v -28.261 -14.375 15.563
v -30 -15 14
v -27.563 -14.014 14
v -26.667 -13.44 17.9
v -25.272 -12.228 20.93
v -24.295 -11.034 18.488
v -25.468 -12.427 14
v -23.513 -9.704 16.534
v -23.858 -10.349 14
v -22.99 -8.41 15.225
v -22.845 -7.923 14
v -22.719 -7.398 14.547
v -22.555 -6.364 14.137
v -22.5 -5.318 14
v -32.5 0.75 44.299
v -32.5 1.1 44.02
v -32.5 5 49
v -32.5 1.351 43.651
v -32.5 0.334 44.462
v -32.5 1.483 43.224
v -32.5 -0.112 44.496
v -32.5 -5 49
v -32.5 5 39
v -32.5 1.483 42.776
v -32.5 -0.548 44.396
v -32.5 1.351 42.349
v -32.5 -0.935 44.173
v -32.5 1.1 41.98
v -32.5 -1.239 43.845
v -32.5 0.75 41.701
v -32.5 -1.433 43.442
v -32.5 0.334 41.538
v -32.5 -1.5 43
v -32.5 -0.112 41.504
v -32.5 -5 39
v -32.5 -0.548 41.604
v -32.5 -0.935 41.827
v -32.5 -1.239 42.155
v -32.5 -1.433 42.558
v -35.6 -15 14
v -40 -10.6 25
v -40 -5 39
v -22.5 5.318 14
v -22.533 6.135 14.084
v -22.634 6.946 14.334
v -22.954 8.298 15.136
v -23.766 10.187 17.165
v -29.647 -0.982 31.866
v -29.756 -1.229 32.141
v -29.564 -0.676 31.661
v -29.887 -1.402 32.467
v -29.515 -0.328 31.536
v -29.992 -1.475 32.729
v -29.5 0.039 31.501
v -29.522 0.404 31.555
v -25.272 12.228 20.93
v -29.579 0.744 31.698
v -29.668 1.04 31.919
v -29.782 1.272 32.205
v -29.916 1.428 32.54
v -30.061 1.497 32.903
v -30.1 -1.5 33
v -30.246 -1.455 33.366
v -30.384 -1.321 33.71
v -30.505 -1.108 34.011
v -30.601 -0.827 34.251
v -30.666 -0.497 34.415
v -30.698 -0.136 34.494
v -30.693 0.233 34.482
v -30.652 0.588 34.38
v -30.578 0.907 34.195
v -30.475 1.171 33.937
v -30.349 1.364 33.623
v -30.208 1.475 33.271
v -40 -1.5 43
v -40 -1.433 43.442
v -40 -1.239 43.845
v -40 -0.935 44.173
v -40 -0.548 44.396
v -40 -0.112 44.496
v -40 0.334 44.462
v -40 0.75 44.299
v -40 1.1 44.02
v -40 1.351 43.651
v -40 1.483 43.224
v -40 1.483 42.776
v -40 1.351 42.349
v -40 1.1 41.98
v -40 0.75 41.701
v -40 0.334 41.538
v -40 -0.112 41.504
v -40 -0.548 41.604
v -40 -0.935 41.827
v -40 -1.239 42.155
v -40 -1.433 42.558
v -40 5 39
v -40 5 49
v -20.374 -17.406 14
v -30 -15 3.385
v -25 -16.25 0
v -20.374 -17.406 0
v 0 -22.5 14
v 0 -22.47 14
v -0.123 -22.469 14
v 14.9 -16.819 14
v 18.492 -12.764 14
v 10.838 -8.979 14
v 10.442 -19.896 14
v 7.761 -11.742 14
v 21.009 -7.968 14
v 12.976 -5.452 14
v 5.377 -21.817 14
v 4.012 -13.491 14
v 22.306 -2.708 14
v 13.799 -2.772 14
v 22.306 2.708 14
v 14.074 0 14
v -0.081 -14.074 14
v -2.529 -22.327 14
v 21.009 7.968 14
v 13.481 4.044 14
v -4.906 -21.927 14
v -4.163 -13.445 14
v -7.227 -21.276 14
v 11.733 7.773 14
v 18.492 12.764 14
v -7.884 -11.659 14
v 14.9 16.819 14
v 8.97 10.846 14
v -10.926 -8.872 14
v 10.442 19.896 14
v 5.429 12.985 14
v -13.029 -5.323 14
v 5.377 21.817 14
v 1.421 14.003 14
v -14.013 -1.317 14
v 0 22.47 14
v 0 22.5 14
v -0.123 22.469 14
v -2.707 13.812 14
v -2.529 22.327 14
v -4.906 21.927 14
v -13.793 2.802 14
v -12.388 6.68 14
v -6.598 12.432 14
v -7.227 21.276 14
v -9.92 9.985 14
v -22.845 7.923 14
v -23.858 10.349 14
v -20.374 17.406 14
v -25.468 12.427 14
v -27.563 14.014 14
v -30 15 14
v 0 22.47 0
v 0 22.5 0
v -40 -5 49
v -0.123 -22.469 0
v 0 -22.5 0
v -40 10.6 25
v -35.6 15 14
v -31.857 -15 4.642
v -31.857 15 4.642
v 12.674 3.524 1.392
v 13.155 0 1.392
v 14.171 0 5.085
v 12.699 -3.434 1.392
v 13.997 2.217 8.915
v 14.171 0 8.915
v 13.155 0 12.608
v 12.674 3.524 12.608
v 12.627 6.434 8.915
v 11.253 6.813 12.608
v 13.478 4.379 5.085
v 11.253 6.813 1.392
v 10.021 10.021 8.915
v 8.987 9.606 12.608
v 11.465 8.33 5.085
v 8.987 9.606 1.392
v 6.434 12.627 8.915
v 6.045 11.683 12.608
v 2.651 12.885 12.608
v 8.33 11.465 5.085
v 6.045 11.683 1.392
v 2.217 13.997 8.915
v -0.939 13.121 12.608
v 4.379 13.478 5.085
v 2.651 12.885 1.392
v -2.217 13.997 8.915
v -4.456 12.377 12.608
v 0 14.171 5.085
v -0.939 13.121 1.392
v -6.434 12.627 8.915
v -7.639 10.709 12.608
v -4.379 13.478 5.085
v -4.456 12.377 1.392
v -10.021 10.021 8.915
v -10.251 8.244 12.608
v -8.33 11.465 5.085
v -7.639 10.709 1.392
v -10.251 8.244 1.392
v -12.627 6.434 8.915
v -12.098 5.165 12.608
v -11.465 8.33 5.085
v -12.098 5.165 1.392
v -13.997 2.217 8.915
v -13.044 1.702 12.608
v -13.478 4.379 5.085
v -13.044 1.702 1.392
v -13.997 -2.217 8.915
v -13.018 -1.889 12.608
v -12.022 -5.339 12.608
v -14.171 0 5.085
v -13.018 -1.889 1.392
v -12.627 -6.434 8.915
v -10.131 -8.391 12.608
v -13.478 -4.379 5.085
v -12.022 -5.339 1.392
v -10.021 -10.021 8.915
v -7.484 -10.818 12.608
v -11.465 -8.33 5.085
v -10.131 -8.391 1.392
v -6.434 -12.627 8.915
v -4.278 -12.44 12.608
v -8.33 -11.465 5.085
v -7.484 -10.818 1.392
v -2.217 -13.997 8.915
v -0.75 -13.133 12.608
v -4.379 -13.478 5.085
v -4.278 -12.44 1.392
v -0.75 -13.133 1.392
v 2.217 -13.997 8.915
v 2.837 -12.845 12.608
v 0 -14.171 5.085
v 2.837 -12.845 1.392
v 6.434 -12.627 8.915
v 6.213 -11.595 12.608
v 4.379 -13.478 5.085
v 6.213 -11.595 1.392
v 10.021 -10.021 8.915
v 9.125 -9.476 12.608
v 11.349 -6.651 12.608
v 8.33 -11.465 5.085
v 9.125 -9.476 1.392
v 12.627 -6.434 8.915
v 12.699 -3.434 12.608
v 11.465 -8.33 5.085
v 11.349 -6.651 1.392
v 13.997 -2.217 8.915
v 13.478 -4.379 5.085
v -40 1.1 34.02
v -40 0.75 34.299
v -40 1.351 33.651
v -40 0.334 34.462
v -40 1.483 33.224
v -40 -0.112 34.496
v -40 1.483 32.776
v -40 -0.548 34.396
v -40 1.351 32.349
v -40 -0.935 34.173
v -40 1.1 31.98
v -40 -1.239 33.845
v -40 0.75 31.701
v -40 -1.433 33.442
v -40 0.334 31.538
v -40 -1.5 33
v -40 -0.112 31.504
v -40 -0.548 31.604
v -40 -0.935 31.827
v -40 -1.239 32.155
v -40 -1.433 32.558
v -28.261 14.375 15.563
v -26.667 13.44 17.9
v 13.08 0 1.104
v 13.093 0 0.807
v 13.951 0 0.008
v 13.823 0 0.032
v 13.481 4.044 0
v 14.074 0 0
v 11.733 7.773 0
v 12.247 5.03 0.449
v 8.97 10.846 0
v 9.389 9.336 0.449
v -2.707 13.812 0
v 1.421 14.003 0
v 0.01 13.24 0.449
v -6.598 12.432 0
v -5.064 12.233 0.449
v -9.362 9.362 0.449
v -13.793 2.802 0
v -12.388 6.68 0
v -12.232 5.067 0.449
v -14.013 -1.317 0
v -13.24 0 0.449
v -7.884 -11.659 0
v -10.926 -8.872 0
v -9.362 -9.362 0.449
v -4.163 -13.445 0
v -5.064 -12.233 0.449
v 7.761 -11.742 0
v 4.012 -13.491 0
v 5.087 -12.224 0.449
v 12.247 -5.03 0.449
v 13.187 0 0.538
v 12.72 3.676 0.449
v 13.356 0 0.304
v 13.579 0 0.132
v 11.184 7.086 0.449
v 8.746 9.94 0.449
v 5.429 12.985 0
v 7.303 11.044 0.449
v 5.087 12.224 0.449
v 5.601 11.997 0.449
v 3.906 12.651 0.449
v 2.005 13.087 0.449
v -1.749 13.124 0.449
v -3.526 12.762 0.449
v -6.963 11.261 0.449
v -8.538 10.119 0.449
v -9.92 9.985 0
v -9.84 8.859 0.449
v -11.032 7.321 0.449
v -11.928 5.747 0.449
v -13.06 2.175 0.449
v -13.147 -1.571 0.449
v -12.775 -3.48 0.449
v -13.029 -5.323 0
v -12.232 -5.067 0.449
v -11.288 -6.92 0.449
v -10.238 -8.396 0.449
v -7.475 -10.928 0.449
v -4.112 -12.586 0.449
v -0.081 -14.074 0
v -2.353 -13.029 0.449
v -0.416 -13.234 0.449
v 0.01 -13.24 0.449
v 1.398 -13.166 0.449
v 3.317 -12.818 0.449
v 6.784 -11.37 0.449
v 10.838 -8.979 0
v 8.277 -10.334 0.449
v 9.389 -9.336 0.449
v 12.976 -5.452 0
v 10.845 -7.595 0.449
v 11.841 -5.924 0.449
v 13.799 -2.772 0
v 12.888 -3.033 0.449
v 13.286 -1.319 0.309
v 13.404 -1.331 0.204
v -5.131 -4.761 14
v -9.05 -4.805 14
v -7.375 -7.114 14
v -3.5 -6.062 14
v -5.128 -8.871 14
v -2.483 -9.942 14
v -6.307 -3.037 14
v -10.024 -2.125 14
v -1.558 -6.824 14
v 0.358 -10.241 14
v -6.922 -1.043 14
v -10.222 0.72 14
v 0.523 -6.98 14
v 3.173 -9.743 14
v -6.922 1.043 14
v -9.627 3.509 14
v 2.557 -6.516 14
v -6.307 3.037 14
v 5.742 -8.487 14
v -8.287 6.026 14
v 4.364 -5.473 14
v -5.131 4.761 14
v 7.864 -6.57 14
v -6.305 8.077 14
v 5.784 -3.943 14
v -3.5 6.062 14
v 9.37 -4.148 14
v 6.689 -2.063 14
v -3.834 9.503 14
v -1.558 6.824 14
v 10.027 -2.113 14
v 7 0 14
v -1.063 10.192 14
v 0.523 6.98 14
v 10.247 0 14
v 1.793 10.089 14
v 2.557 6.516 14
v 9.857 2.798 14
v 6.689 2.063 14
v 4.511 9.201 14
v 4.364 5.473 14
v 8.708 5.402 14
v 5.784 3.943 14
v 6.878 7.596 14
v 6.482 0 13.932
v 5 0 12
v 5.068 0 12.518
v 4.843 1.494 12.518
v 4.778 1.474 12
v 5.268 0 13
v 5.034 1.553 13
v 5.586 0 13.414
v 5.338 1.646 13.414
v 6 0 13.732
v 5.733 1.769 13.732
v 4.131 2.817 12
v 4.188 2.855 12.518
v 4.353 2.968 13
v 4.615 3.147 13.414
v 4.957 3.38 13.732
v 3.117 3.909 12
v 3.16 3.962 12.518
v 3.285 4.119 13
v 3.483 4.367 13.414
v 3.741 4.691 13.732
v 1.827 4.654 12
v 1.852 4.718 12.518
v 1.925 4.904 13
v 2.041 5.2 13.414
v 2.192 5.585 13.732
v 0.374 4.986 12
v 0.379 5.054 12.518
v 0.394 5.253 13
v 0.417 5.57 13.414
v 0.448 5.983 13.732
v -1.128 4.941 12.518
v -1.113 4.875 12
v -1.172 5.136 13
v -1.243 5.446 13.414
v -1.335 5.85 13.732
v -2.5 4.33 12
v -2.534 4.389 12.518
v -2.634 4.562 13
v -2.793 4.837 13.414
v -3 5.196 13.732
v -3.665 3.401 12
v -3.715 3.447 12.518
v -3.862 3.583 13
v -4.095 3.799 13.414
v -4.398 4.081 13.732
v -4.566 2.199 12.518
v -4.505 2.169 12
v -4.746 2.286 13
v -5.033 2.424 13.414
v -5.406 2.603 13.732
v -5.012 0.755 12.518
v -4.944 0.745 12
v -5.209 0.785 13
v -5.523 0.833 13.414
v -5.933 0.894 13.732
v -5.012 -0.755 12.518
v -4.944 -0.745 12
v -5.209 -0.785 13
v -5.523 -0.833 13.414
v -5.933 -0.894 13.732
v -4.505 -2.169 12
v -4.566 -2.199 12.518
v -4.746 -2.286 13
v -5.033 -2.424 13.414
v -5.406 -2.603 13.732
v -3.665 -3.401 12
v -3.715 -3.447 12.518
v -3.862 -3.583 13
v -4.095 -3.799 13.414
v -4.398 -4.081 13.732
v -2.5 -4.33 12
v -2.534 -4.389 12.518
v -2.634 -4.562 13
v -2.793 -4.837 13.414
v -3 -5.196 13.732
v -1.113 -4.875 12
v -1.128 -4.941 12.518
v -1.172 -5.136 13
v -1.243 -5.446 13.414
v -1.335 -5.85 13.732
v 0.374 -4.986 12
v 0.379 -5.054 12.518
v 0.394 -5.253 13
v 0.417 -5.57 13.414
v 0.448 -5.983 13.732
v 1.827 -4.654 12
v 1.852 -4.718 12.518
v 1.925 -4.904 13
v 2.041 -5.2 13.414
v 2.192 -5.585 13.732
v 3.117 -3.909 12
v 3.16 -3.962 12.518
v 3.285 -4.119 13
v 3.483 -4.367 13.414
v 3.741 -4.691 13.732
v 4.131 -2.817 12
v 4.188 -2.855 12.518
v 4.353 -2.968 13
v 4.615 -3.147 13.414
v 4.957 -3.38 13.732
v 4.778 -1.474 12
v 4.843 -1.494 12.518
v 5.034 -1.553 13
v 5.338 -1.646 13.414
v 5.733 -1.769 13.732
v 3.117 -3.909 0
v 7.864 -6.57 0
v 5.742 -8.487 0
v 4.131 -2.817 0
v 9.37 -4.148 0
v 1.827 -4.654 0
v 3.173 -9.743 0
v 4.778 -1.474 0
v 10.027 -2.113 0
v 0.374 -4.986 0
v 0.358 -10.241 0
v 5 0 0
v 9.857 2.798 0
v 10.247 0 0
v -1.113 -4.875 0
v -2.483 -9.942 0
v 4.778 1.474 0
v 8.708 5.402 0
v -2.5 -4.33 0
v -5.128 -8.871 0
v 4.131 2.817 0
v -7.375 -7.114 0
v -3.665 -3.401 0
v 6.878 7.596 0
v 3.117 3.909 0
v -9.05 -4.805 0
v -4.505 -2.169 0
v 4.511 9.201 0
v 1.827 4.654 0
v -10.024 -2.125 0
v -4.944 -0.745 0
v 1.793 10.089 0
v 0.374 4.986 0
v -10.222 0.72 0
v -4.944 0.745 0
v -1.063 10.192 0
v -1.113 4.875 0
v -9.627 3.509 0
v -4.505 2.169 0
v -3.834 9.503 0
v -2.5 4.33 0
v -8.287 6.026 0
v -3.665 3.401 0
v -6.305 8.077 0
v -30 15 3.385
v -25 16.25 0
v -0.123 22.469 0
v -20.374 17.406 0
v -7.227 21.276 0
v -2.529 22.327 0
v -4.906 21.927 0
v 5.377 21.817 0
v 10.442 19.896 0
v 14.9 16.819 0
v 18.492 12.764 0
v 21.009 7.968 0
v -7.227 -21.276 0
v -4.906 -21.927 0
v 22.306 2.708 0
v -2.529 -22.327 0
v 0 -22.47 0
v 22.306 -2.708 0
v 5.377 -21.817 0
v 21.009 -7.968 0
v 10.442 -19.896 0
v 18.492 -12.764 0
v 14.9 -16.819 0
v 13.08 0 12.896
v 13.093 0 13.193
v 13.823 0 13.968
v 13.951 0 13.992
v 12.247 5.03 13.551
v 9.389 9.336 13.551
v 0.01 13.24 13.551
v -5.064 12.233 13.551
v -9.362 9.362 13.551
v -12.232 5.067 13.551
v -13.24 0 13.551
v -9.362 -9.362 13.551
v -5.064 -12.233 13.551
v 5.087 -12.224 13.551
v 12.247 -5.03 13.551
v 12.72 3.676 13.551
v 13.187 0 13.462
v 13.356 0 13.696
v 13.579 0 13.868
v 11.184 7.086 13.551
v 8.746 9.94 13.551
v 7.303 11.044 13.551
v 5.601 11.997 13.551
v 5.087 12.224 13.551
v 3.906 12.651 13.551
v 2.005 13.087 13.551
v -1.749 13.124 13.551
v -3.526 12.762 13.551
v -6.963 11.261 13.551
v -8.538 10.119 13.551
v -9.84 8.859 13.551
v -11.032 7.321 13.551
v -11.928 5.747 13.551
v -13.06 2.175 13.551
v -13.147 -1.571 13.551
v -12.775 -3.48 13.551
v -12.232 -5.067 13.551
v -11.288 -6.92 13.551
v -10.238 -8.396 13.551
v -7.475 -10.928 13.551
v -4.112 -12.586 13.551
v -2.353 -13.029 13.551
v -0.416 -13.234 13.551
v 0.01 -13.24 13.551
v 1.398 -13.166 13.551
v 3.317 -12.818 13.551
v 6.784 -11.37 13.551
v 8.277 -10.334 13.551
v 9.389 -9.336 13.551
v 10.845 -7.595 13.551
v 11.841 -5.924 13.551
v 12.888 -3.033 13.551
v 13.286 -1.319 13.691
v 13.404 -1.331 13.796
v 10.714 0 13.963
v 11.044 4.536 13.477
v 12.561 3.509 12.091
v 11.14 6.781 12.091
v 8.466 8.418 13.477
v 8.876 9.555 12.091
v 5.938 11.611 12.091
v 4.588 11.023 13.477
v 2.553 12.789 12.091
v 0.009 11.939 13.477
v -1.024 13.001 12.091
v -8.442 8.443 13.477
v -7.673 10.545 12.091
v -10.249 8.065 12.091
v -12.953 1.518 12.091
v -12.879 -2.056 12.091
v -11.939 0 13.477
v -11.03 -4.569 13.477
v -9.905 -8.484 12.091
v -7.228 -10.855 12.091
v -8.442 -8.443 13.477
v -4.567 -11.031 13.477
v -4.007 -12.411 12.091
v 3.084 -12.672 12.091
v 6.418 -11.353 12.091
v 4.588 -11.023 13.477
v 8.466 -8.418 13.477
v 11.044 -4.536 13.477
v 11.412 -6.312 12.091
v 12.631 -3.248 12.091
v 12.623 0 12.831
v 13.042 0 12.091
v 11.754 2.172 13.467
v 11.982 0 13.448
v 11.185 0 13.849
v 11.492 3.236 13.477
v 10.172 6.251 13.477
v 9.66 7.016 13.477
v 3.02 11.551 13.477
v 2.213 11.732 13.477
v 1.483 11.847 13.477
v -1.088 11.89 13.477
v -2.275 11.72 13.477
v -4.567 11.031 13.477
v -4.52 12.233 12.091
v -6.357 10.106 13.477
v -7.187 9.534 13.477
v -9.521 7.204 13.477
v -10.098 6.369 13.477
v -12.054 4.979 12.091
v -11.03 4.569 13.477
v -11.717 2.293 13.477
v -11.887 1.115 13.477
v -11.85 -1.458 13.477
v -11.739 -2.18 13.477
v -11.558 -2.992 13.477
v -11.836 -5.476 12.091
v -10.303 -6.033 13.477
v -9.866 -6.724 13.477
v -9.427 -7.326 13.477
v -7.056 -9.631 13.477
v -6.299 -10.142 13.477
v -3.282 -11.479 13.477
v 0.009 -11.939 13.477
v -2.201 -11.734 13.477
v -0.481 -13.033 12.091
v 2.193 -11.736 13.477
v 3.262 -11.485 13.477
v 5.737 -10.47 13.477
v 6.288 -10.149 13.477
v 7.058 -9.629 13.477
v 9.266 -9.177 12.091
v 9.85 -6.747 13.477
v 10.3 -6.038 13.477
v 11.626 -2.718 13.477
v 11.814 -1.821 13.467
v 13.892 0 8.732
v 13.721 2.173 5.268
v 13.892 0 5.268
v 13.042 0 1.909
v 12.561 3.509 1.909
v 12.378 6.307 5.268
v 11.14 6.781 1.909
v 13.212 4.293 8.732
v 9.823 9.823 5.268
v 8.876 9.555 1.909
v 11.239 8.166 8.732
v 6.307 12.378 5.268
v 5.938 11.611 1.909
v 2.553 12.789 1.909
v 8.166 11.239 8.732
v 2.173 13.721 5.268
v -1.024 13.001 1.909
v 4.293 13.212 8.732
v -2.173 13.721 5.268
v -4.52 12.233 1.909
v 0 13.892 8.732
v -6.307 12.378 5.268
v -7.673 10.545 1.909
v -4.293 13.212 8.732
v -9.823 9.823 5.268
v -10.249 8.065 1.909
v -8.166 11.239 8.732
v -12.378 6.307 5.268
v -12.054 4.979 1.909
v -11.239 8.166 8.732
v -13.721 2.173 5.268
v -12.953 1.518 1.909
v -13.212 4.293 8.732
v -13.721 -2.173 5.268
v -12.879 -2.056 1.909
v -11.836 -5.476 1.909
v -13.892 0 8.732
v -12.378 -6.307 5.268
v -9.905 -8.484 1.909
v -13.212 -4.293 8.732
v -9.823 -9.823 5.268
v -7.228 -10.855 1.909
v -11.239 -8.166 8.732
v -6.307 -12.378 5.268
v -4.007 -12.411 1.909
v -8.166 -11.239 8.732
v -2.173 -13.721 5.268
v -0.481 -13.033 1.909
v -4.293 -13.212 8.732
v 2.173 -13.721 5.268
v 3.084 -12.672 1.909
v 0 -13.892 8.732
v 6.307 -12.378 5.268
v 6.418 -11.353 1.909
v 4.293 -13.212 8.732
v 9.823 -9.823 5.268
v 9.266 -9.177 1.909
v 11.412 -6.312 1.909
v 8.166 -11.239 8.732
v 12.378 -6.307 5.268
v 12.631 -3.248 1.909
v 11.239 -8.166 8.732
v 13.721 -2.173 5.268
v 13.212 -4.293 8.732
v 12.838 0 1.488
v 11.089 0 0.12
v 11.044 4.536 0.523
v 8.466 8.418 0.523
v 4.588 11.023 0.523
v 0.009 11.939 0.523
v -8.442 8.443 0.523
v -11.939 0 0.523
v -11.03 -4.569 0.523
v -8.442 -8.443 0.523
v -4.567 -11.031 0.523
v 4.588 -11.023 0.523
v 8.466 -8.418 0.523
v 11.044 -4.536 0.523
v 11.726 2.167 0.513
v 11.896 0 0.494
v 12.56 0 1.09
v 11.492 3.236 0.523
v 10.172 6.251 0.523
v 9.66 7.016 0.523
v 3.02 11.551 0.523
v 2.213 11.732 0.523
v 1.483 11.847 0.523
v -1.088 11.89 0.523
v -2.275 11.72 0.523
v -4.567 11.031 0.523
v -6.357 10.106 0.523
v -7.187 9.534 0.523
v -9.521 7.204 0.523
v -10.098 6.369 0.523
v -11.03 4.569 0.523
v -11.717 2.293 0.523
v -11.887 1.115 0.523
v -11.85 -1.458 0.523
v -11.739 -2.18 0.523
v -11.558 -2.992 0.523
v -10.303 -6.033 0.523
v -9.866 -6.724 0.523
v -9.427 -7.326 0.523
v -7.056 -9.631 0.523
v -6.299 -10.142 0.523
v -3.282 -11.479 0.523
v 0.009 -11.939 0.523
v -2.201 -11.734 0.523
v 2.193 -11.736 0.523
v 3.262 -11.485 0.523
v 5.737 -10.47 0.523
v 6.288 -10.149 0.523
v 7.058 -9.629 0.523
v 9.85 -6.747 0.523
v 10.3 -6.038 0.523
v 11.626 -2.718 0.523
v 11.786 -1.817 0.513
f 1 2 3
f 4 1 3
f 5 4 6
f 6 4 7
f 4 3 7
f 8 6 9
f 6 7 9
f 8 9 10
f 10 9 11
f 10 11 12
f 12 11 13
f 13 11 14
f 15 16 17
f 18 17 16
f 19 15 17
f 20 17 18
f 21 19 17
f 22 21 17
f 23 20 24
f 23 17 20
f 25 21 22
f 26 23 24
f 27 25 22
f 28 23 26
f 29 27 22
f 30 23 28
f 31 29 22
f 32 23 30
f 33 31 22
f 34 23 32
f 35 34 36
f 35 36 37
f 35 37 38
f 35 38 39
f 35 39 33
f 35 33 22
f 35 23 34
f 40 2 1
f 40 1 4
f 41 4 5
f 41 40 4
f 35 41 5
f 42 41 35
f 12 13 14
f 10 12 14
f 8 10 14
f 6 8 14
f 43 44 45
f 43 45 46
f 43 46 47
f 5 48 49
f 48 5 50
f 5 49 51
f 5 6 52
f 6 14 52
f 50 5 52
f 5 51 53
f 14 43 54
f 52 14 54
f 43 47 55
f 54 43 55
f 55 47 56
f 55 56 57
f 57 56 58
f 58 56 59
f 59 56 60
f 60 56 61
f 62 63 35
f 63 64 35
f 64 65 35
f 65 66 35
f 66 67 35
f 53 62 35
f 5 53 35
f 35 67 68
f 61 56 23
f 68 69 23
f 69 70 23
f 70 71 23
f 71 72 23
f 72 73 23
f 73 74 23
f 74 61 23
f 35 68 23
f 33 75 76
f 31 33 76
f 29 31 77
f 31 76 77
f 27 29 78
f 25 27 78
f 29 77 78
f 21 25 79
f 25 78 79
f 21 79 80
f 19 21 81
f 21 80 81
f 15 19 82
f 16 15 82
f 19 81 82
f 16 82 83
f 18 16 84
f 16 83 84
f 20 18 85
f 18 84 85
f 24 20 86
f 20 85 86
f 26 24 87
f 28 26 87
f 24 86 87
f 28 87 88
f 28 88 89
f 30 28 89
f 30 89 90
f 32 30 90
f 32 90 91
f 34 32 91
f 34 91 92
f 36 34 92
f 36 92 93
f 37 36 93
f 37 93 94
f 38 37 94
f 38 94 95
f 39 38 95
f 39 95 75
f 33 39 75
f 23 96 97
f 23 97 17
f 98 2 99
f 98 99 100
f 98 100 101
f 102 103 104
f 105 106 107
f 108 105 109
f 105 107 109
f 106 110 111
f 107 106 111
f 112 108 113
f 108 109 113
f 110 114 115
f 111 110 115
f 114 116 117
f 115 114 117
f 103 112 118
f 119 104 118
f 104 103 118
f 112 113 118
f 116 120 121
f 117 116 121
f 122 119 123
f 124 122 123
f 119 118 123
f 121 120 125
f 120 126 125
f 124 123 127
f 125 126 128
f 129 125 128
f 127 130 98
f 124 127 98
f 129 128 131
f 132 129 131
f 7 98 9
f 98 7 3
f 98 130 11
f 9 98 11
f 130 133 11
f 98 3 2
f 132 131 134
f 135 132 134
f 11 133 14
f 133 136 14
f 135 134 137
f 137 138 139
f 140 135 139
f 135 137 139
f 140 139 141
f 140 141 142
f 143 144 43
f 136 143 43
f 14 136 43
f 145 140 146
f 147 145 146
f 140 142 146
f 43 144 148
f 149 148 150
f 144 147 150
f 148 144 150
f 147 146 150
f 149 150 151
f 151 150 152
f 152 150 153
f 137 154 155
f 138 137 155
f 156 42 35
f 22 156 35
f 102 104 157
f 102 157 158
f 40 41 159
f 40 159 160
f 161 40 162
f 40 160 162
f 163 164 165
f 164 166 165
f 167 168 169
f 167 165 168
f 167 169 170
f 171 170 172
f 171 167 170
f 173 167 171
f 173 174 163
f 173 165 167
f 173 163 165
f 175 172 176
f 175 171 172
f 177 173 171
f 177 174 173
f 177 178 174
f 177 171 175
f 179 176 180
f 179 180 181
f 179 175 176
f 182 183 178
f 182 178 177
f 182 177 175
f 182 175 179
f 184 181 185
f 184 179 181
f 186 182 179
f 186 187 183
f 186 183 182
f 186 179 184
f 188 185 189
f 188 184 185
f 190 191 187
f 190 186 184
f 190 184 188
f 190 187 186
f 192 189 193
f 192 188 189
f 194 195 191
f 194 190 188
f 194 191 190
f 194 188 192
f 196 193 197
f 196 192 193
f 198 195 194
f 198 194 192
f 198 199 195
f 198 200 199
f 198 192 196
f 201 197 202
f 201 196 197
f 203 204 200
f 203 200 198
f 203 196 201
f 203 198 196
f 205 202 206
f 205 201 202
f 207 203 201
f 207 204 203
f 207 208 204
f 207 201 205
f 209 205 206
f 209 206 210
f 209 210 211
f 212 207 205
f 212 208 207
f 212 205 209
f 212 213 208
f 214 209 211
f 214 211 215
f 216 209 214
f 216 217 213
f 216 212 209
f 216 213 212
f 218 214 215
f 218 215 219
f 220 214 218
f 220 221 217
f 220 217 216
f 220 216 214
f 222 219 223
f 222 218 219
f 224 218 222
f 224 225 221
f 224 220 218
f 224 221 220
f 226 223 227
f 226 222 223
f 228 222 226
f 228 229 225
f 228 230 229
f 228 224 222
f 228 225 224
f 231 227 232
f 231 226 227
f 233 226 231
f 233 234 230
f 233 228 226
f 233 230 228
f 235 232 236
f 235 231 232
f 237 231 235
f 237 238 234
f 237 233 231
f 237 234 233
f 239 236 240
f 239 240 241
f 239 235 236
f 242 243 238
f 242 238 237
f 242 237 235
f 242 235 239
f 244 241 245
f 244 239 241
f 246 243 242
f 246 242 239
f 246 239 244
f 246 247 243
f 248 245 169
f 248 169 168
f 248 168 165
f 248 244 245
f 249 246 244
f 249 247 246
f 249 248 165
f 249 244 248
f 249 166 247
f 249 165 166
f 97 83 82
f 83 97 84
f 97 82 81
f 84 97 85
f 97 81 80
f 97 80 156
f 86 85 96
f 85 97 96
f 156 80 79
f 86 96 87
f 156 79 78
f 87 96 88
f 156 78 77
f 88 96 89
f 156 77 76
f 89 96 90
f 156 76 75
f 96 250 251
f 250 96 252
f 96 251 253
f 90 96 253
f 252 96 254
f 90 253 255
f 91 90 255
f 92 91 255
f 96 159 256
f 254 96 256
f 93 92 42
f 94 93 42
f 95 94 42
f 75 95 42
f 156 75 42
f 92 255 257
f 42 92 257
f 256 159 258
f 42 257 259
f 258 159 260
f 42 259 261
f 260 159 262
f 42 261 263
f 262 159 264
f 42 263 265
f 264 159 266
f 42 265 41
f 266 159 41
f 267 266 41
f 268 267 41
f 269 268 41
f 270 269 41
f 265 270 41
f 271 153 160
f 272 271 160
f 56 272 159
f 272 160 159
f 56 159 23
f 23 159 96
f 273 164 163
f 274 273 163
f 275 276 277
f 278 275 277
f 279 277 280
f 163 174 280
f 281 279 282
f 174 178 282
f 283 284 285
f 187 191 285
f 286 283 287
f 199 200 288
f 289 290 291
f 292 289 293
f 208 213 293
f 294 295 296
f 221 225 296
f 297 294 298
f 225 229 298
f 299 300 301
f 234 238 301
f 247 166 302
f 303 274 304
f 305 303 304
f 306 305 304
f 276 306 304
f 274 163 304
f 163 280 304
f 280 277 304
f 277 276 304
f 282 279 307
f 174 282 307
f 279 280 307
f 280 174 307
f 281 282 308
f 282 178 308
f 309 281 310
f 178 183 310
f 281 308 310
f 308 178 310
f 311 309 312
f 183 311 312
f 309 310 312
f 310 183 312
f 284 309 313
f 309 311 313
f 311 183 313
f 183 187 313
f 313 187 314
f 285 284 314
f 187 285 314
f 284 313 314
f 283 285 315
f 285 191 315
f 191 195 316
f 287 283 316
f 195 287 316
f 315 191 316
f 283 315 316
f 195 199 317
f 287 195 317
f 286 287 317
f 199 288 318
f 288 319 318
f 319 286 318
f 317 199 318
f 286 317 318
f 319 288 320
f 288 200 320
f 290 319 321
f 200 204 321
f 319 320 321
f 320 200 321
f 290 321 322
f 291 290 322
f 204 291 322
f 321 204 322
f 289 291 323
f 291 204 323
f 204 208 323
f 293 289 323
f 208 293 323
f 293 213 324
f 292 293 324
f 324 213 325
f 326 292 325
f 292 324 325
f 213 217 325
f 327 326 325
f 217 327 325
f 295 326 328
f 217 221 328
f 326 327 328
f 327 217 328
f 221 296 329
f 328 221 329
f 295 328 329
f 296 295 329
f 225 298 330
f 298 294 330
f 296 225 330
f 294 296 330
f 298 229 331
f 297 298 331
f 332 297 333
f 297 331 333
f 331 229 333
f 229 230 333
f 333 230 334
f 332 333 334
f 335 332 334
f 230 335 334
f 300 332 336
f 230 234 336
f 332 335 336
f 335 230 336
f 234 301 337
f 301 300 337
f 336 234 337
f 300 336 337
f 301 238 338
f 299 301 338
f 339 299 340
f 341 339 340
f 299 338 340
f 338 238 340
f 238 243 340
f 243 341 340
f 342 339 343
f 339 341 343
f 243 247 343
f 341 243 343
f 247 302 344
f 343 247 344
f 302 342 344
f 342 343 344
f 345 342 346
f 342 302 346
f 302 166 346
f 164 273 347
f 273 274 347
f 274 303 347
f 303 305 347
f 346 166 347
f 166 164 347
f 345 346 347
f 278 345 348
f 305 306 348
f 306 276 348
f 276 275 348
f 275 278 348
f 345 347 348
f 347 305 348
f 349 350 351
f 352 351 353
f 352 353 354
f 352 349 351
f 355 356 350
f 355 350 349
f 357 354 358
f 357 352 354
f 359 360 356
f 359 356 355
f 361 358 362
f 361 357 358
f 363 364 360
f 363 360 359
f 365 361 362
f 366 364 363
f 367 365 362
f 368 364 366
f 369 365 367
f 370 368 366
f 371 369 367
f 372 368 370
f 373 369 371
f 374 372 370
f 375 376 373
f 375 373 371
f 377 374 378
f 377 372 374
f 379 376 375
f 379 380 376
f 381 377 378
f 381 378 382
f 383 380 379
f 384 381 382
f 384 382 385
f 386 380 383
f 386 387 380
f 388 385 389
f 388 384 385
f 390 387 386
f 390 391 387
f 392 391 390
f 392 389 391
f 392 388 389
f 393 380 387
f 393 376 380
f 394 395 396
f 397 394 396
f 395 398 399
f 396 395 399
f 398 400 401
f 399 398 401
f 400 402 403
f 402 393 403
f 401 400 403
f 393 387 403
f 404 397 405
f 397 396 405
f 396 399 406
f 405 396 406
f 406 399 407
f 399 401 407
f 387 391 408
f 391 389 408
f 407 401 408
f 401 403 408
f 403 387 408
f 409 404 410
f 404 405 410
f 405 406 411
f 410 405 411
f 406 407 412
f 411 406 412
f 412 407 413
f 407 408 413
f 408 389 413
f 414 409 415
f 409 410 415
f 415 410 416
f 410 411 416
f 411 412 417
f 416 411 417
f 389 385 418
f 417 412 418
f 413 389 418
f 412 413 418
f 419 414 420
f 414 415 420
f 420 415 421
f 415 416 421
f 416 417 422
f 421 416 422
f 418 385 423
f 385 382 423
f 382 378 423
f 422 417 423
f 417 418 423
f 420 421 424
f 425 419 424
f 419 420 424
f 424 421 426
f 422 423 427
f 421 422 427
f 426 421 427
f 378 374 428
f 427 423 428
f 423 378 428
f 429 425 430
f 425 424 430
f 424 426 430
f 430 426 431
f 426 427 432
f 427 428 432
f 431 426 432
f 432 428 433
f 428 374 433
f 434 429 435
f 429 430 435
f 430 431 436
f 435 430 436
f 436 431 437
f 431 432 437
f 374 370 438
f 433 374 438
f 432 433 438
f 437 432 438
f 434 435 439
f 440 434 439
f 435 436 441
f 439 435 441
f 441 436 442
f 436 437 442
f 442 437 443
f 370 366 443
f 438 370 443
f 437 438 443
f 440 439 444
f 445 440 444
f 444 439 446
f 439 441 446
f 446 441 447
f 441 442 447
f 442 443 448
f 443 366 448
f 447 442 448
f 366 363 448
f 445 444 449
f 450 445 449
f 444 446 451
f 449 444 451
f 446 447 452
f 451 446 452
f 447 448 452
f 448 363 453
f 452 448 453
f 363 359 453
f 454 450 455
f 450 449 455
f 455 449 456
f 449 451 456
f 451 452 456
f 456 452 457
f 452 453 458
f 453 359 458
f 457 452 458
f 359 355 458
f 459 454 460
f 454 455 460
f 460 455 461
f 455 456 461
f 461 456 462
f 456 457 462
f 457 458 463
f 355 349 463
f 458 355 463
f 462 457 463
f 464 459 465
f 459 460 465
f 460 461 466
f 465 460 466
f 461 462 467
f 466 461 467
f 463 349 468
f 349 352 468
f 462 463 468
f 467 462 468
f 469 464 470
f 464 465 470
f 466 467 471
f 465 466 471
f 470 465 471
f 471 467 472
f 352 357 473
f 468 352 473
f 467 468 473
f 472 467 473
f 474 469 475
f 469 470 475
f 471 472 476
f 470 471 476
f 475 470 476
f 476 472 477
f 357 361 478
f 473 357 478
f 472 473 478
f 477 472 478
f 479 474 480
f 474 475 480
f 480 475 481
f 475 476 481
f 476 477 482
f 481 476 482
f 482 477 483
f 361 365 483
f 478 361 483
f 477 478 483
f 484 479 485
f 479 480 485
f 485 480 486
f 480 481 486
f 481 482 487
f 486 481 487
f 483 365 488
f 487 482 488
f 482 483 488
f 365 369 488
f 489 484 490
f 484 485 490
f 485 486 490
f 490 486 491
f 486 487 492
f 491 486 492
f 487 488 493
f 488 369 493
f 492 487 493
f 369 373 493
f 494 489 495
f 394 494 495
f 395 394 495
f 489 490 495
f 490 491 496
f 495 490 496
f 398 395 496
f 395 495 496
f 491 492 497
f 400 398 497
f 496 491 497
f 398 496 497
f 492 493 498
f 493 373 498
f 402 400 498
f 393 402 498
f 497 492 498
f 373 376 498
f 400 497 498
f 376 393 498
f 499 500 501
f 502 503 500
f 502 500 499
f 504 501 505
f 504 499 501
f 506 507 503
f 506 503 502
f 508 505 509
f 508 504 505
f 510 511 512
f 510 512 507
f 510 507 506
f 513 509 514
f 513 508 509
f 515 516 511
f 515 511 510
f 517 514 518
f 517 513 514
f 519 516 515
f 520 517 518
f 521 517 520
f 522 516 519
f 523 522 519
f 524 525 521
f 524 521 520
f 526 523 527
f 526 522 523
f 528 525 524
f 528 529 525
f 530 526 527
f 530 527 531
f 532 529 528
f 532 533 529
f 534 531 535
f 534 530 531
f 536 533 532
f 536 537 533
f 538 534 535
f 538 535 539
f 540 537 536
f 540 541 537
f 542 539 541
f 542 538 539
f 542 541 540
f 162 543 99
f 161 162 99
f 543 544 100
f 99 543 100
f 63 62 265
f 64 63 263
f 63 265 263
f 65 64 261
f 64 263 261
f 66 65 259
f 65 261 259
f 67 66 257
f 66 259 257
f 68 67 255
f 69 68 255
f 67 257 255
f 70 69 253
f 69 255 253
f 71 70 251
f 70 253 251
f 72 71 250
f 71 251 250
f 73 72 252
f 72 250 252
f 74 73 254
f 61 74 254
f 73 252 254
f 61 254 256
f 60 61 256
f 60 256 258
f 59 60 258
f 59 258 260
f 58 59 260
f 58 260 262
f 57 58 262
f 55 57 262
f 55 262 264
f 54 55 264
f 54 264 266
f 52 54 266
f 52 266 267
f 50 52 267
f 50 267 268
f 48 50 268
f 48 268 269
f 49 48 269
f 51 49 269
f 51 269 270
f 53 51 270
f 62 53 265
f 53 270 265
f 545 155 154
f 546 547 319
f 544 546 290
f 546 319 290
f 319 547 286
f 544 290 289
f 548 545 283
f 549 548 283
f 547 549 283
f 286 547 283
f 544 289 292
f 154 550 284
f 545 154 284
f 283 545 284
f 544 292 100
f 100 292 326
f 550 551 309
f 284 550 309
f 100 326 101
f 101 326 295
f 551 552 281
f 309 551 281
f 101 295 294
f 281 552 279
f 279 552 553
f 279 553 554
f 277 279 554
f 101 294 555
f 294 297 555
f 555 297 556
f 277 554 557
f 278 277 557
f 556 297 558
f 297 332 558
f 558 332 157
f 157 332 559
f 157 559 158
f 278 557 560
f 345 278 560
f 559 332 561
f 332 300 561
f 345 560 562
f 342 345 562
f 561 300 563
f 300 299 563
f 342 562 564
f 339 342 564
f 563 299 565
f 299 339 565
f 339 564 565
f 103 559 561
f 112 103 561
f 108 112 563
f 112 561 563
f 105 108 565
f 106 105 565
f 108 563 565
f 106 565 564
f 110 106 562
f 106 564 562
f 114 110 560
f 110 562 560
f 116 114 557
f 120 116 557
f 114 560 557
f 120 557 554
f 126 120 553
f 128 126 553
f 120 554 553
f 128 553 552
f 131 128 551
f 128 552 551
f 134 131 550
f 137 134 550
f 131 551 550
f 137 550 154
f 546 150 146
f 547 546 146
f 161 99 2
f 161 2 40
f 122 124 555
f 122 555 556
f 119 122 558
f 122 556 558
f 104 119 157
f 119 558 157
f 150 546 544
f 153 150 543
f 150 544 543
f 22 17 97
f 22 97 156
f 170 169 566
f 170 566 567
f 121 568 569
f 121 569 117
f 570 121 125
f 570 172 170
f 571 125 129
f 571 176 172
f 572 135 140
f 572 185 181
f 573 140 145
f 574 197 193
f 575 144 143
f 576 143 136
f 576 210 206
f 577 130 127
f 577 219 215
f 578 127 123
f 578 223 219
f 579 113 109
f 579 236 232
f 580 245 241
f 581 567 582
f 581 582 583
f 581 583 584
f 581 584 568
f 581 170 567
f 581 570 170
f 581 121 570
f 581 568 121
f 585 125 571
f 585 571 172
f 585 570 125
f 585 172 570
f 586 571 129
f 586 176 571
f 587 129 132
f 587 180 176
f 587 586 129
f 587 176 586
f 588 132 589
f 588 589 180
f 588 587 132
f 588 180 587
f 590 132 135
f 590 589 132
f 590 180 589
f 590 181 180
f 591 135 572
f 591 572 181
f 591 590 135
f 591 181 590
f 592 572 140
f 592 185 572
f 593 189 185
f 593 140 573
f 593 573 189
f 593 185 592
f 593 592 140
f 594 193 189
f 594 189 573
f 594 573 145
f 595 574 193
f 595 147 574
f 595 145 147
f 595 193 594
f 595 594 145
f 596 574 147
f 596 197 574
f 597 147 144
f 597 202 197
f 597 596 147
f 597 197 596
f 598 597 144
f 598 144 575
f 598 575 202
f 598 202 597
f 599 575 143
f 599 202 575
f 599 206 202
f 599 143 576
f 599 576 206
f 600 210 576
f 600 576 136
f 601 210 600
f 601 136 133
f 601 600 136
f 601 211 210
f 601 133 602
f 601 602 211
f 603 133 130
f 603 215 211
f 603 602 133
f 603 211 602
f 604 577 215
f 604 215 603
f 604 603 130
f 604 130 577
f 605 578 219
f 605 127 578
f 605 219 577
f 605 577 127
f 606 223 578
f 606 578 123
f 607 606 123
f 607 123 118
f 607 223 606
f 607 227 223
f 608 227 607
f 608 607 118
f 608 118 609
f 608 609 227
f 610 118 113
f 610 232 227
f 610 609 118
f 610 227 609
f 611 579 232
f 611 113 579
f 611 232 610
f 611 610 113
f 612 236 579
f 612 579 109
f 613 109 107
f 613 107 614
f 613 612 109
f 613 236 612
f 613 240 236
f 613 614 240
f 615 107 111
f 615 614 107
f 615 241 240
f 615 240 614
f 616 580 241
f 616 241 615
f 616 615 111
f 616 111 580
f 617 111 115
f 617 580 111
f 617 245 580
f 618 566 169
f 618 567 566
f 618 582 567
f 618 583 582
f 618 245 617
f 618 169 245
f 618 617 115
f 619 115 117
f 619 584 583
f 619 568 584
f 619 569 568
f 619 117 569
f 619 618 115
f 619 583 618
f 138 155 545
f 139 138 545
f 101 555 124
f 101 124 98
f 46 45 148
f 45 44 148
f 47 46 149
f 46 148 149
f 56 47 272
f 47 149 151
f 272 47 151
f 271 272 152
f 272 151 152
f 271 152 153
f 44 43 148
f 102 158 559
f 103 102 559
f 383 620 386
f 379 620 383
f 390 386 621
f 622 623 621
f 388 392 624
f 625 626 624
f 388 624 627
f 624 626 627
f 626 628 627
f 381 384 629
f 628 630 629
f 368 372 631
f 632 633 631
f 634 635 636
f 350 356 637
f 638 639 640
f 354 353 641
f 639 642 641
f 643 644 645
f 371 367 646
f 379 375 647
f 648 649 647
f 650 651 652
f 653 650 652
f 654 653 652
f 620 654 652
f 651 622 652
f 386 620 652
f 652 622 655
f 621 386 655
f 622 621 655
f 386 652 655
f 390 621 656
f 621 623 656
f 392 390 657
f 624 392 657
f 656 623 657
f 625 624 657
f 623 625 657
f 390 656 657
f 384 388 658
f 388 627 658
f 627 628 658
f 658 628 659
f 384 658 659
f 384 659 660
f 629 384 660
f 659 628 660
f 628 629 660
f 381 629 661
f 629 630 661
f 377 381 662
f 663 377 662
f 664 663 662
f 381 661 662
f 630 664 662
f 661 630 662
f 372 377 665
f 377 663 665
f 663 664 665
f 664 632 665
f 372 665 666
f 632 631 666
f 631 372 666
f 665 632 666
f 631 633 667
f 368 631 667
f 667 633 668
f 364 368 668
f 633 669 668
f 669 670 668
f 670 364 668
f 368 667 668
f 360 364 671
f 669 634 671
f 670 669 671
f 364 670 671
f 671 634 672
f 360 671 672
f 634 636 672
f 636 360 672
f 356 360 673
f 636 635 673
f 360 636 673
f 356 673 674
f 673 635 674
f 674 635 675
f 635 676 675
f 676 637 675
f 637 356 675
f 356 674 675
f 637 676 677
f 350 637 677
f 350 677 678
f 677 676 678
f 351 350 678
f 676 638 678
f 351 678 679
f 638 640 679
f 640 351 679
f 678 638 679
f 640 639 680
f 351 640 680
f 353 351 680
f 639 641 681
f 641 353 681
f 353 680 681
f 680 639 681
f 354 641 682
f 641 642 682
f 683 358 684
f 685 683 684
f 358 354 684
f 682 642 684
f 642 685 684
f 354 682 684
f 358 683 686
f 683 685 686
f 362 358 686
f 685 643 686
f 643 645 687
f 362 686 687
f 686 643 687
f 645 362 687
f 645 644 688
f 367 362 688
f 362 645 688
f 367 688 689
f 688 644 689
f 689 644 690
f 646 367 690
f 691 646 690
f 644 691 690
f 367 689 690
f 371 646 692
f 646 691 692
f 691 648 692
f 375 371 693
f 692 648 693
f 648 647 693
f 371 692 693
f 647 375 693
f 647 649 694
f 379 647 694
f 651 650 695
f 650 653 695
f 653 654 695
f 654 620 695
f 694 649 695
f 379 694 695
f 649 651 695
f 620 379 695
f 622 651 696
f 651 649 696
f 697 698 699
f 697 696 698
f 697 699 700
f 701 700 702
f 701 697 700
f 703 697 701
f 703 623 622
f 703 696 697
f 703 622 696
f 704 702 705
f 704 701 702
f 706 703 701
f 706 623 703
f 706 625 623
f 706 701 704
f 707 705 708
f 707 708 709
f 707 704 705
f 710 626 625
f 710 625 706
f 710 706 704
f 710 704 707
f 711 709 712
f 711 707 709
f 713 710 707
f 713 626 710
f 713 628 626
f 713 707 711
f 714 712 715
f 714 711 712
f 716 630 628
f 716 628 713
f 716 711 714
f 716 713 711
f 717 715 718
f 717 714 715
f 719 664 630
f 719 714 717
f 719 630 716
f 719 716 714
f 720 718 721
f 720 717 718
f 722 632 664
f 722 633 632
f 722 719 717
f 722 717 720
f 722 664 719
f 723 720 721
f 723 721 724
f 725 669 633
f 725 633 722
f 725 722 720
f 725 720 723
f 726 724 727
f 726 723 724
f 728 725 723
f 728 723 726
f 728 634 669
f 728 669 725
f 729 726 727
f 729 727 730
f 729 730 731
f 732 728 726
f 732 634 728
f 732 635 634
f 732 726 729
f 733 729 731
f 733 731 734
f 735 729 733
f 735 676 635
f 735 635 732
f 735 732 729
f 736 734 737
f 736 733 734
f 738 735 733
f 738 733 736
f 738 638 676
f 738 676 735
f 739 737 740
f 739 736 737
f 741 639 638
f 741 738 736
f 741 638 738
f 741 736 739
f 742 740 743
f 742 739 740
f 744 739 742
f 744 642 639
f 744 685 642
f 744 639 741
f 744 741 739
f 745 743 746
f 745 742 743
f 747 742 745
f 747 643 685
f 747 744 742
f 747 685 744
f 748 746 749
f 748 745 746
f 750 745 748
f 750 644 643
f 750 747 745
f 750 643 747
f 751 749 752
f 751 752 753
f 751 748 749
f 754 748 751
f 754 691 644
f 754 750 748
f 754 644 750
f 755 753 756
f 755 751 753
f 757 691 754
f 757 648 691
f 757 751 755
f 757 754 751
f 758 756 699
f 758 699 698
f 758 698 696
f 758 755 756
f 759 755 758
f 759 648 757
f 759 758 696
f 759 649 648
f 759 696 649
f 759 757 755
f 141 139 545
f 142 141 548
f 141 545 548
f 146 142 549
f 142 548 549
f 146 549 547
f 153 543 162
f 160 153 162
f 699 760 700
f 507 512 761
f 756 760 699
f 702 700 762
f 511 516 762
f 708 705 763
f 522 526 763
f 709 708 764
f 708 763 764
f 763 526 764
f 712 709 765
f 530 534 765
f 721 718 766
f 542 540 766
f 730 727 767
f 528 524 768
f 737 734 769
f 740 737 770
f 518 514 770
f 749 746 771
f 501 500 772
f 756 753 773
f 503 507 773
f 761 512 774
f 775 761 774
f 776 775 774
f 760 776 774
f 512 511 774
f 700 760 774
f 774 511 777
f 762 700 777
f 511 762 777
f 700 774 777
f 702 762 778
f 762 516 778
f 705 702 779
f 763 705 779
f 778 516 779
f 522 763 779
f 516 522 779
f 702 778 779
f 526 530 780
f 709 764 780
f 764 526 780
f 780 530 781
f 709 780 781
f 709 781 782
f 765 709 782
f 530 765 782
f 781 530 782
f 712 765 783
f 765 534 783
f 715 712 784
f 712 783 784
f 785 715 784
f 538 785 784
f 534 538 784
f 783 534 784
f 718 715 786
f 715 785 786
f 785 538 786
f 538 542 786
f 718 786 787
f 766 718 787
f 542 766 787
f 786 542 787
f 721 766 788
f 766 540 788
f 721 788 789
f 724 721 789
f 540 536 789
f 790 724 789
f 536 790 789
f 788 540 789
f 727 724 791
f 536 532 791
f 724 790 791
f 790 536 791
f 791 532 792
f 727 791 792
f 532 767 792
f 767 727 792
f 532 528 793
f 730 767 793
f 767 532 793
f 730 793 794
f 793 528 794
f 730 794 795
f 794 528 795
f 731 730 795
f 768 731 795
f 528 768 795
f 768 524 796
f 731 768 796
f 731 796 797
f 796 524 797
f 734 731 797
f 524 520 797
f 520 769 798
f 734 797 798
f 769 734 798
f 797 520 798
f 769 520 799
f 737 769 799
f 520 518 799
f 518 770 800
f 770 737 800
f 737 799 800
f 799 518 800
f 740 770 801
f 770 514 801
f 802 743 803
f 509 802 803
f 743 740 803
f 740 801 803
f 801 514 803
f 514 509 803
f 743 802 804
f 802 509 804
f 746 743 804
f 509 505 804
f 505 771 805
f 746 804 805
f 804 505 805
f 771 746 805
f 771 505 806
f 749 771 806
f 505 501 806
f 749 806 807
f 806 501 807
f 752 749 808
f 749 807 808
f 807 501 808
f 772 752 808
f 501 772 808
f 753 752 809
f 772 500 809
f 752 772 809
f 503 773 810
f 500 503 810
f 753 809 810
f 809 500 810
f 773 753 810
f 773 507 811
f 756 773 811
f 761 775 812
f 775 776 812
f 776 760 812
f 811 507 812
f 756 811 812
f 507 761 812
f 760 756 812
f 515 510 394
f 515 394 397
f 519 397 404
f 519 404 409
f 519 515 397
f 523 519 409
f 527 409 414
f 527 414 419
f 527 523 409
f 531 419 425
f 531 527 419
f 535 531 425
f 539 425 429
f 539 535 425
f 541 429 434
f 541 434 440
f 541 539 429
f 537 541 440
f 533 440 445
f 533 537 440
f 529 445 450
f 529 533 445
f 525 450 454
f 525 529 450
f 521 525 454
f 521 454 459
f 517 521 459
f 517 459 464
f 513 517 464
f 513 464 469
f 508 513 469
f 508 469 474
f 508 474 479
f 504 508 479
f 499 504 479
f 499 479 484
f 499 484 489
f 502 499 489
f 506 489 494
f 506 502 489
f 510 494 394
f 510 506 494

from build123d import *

# Parameters (mm, degrees)
F3_R         = 3
F4_R         = 1
F6_DEPTH     = 14
F7_T1_DEPTH  = 14
F8_DEPTH     = 10
F9_DEPTH     = 25
F10_W        = 50
F10_H        = 100
F11_DEPTH    = 50
F12_T1_DEPTH = 53.8936459138
F13_T1_DEPTH = 139.6556819565
F14_T4_DEPTH = 139.6556819565
F15_T1_DEPTH = 159.6556819565
F16_SIZE     = 5
F17_DEPTH    = 10
F18_R        = 1.5
F19_DEPTH    = 25
F20_R        = 2


# Not quite as in the source:
# - a fillet or chamfer that OpenCascade refuses, or shapes differently, is made with other operations: its cross-section is extruded or revolved along the edge and cut away or added


with BuildPart() as f2:
    # F0 (on Front) → F2 (revolve)
    with BuildSketch(Plane.XZ):
        with BuildLine():
            Line((5, 0), (12.124355653, 0))
            ThreePointArc((12.124355653, 0), (14, 7), (12.124355653, 14))
            Line((12.124355653, 14), (5, 14))
            Line((5, 14), (5, 0))
        make_face()
    revolve(axis=Axis((0, 0, 12.6064065844), (0, 0, 1)))

    # F3
    f3_edges = [f2.edges().sort_by_distance(p)[0] for p in [
        (-12.124356, 0, 14),
        (-12.124356, 0, 0),
    ]]
    fillet(f3_edges, radius=F3_R)

    # F20
    f20_edges = [f2.edges().sort_by_distance(p)[0] for p in [
        (-5, 0, 14),
    ]]
    fillet(f20_edges, radius=F20_R)


with BuildPart() as f2b:
    # F0 (on Front) → F2, piece 2 (revolve)
    with BuildSketch(Plane.XZ):
        with BuildLine():
            ThreePointArc((12.4695629434, 14), (14.3, 7), (12.4695629434, 0))
            Line((12.4695629434, 0), (22.4695629434, 0))
            Line((22.4695629434, 0), (22.4695629434, 14))
            Line((22.4695629434, 14), (12.4695629434, 14))
        make_face()
    revolve(axis=Axis((0, 0, 12.6064065844), (0, 0, 1)))

    # F4
    f4_edges = [f2b.edges().sort_by_distance(p)[0] for p in [
        (-12.469563, 0, 14),
        (-12.469563, 0, 0),
    ]]
    fillet(f4_edges, radius=F4_R)

    # F5 (on Top) → F6 (join)
    with BuildSketch(Plane.XY):
        Polygon((-15.7520063221, 9.0848943219), (0, 19.2215126008), (0, 22.5), (-30, 15), (-30, -15), (0, -22.5), (0, -18.8700128347), (-15.7520063221, -9.3158083037), align=None)
    extrude(amount=F6_DEPTH)

    # F7: chamfer of 20 on 2 edges, made by hand

    # F7_s2 → F7_t1 (join)
    with BuildSketch(Plane.XY):
        with BuildLine():
            Line((-6.4594864096, -21.5014925715), (-21.141510961, -17.1806268176))
            Line((-21.141510961, -17.1806268176), (-21.044496711, -16.7925698176))
            ThreePointArc((-21.044496711, -16.7925698176), (-15.7103098501, -18.1601119749), (-10.3681240616, -19.495658422))
            Line((-10.3681240616, -19.495658422), (-10.278839391, -19.5297483161))
            ThreePointArc((-10.278839391, -19.5297483161), (-8.3538564635, -20.4274004881), (-6.33083341, -21.1227467389))
            Line((-6.33083341, -21.1227467389), (-6.4594864096, -21.5014925715))
        make_face()
        with BuildLine():
            Line((-21.141510961, 17.1806268176), (-6.4594864096, 21.5014925715))
            Line((-6.4594864096, 21.5014925715), (-6.33083341, 21.1227467389))
            ThreePointArc((-6.33083341, 21.1227467389), (-8.3538564635, 20.4274004881), (-10.278839391, 19.5297483161))
            Line((-10.278839391, 19.5297483161), (-10.3681240616, 19.495658422))
            ThreePointArc((-10.3681240616, 19.495658422), (-15.7103098501, 18.1601119749), (-21.044496711, 16.7925698176))
            Line((-21.044496711, 16.7925698176), (-21.141510961, 17.1806268176))
        make_face()
    extrude(amount=F7_T1_DEPTH)

    # F8 (add): a face of the model
    f8_faces = [f2b.faces().sort_by_distance(p)[0] for p in [
        (-30, 0, 7),
    ]]
    extrude(f8_faces, amount=F8_DEPTH)

    # F9 (add): a face of the model
    f9_faces = [f2b.faces().sort_by_distance(p)[0] for p in [
        (21.6996638372, 0, 14),
    ]]
    extrude(f9_faces, amount=F9_DEPTH)

    # F10 (on Front) → F11 (cut, symmetric)
    with BuildSketch(Plane.XZ):
        with Locations((2.5, 64)):
            Rectangle(F10_W, F10_H)
    extrude(amount=F11_DEPTH, both=True, mode=Mode.SUBTRACT)

    # F12: fillet of radius 10 on 2 edges, made by hand

    # F12_s2 → F12_t1 (cut)
    with BuildSketch(Plane.XY.offset(14)):
        with BuildLine():
            ThreePointArc((-30, -15), (-24.5943058496, -11.4412659914), (-22.5, -5.3175416345))
            Line((-22.5, -5.3175416345), (-22.5, -16.875))
            Line((-22.5, -16.875), (-30, -15))
        make_face()
        with BuildLine():
            ThreePointArc((-22.5, 5.3175416345), (-24.5943058496, 11.4412659914), (-30, 15))
            Line((-30, 15), (-22.5, 16.875))
            Line((-22.5, 16.875), (-22.5, 5.3175416345))
        make_face()
    extrude(amount=F12_T1_DEPTH, mode=Mode.SUBTRACT)

    # F13: chamfer of 10 x 25 on 2 edges, made by hand

    # F13_s2 → F13_t1 (cut)
    with BuildSketch(Plane.YZ.offset(-104.8278409783)):
        Polygon((-15, 14), (-5, 39), (-15, 39), align=None)
        Polygon((15, 14), (5, 39), (15, 39), align=None)
    extrude(amount=F13_T1_DEPTH, mode=Mode.SUBTRACT)

    # F14: chamfer of 25 x 10 on 1 edges, made by hand


with BuildPart() as f14_tool2:
    # F14_s3 → F14_t4 (new body)
    with BuildSketch(Plane.XZ.offset(-69.8278409783)):
        Polygon((-22.5, 14), (-32.5, 39), (-22.5, 39), align=None)
    extrude(amount=F14_T4_DEPTH)

    split(bisect_by=Plane.XY.offset(14), keep=Keep.TOP)


with BuildPart() as f2b_1:
    add(f2b.part)

    # F14_t1: cut F14_tool2
    add(f14_tool2.part, mode=Mode.SUBTRACT)

    # F15: chamfer of 10 x 25 on 1 edges, made by hand

    # F15_s2 → F15_t1 (cut)
    with BuildSketch(Plane.XZ.offset(-79.8278409783)):
        Polygon((-40, 25), (-30, 0), (-40, 0), align=None)
    extrude(amount=F15_T1_DEPTH, mode=Mode.SUBTRACT)

    # F16
    f16_edges = [f2b_1.edges().sort_by_distance(p)[0] for p in [
        (-30, 0, 0),
    ]]
    chamfer(f16_edges, length=F16_SIZE)

    # F17 (add): a face of the model
    f17_faces = [f2b_1.faces().sort_by_distance(p)[0] for p in [
        (-36.25, 0, 39),
    ]]
    extrude(f17_faces, amount=F17_DEPTH)

    # F18 (on face) → F19 (cut)
    with BuildSketch(Plane(origin=(-40, 0, 0), x_dir=(0, -1, 0), z_dir=(-1, 0, 0))):
        with Locations((0, 33)):
            Circle(F18_R)
        with Locations((0, 43)):
            Circle(F18_R)
    extrude(amount=-F19_DEPTH, mode=Mode.SUBTRACT)


solid = Compound([f2.part, f2b_1.part])
